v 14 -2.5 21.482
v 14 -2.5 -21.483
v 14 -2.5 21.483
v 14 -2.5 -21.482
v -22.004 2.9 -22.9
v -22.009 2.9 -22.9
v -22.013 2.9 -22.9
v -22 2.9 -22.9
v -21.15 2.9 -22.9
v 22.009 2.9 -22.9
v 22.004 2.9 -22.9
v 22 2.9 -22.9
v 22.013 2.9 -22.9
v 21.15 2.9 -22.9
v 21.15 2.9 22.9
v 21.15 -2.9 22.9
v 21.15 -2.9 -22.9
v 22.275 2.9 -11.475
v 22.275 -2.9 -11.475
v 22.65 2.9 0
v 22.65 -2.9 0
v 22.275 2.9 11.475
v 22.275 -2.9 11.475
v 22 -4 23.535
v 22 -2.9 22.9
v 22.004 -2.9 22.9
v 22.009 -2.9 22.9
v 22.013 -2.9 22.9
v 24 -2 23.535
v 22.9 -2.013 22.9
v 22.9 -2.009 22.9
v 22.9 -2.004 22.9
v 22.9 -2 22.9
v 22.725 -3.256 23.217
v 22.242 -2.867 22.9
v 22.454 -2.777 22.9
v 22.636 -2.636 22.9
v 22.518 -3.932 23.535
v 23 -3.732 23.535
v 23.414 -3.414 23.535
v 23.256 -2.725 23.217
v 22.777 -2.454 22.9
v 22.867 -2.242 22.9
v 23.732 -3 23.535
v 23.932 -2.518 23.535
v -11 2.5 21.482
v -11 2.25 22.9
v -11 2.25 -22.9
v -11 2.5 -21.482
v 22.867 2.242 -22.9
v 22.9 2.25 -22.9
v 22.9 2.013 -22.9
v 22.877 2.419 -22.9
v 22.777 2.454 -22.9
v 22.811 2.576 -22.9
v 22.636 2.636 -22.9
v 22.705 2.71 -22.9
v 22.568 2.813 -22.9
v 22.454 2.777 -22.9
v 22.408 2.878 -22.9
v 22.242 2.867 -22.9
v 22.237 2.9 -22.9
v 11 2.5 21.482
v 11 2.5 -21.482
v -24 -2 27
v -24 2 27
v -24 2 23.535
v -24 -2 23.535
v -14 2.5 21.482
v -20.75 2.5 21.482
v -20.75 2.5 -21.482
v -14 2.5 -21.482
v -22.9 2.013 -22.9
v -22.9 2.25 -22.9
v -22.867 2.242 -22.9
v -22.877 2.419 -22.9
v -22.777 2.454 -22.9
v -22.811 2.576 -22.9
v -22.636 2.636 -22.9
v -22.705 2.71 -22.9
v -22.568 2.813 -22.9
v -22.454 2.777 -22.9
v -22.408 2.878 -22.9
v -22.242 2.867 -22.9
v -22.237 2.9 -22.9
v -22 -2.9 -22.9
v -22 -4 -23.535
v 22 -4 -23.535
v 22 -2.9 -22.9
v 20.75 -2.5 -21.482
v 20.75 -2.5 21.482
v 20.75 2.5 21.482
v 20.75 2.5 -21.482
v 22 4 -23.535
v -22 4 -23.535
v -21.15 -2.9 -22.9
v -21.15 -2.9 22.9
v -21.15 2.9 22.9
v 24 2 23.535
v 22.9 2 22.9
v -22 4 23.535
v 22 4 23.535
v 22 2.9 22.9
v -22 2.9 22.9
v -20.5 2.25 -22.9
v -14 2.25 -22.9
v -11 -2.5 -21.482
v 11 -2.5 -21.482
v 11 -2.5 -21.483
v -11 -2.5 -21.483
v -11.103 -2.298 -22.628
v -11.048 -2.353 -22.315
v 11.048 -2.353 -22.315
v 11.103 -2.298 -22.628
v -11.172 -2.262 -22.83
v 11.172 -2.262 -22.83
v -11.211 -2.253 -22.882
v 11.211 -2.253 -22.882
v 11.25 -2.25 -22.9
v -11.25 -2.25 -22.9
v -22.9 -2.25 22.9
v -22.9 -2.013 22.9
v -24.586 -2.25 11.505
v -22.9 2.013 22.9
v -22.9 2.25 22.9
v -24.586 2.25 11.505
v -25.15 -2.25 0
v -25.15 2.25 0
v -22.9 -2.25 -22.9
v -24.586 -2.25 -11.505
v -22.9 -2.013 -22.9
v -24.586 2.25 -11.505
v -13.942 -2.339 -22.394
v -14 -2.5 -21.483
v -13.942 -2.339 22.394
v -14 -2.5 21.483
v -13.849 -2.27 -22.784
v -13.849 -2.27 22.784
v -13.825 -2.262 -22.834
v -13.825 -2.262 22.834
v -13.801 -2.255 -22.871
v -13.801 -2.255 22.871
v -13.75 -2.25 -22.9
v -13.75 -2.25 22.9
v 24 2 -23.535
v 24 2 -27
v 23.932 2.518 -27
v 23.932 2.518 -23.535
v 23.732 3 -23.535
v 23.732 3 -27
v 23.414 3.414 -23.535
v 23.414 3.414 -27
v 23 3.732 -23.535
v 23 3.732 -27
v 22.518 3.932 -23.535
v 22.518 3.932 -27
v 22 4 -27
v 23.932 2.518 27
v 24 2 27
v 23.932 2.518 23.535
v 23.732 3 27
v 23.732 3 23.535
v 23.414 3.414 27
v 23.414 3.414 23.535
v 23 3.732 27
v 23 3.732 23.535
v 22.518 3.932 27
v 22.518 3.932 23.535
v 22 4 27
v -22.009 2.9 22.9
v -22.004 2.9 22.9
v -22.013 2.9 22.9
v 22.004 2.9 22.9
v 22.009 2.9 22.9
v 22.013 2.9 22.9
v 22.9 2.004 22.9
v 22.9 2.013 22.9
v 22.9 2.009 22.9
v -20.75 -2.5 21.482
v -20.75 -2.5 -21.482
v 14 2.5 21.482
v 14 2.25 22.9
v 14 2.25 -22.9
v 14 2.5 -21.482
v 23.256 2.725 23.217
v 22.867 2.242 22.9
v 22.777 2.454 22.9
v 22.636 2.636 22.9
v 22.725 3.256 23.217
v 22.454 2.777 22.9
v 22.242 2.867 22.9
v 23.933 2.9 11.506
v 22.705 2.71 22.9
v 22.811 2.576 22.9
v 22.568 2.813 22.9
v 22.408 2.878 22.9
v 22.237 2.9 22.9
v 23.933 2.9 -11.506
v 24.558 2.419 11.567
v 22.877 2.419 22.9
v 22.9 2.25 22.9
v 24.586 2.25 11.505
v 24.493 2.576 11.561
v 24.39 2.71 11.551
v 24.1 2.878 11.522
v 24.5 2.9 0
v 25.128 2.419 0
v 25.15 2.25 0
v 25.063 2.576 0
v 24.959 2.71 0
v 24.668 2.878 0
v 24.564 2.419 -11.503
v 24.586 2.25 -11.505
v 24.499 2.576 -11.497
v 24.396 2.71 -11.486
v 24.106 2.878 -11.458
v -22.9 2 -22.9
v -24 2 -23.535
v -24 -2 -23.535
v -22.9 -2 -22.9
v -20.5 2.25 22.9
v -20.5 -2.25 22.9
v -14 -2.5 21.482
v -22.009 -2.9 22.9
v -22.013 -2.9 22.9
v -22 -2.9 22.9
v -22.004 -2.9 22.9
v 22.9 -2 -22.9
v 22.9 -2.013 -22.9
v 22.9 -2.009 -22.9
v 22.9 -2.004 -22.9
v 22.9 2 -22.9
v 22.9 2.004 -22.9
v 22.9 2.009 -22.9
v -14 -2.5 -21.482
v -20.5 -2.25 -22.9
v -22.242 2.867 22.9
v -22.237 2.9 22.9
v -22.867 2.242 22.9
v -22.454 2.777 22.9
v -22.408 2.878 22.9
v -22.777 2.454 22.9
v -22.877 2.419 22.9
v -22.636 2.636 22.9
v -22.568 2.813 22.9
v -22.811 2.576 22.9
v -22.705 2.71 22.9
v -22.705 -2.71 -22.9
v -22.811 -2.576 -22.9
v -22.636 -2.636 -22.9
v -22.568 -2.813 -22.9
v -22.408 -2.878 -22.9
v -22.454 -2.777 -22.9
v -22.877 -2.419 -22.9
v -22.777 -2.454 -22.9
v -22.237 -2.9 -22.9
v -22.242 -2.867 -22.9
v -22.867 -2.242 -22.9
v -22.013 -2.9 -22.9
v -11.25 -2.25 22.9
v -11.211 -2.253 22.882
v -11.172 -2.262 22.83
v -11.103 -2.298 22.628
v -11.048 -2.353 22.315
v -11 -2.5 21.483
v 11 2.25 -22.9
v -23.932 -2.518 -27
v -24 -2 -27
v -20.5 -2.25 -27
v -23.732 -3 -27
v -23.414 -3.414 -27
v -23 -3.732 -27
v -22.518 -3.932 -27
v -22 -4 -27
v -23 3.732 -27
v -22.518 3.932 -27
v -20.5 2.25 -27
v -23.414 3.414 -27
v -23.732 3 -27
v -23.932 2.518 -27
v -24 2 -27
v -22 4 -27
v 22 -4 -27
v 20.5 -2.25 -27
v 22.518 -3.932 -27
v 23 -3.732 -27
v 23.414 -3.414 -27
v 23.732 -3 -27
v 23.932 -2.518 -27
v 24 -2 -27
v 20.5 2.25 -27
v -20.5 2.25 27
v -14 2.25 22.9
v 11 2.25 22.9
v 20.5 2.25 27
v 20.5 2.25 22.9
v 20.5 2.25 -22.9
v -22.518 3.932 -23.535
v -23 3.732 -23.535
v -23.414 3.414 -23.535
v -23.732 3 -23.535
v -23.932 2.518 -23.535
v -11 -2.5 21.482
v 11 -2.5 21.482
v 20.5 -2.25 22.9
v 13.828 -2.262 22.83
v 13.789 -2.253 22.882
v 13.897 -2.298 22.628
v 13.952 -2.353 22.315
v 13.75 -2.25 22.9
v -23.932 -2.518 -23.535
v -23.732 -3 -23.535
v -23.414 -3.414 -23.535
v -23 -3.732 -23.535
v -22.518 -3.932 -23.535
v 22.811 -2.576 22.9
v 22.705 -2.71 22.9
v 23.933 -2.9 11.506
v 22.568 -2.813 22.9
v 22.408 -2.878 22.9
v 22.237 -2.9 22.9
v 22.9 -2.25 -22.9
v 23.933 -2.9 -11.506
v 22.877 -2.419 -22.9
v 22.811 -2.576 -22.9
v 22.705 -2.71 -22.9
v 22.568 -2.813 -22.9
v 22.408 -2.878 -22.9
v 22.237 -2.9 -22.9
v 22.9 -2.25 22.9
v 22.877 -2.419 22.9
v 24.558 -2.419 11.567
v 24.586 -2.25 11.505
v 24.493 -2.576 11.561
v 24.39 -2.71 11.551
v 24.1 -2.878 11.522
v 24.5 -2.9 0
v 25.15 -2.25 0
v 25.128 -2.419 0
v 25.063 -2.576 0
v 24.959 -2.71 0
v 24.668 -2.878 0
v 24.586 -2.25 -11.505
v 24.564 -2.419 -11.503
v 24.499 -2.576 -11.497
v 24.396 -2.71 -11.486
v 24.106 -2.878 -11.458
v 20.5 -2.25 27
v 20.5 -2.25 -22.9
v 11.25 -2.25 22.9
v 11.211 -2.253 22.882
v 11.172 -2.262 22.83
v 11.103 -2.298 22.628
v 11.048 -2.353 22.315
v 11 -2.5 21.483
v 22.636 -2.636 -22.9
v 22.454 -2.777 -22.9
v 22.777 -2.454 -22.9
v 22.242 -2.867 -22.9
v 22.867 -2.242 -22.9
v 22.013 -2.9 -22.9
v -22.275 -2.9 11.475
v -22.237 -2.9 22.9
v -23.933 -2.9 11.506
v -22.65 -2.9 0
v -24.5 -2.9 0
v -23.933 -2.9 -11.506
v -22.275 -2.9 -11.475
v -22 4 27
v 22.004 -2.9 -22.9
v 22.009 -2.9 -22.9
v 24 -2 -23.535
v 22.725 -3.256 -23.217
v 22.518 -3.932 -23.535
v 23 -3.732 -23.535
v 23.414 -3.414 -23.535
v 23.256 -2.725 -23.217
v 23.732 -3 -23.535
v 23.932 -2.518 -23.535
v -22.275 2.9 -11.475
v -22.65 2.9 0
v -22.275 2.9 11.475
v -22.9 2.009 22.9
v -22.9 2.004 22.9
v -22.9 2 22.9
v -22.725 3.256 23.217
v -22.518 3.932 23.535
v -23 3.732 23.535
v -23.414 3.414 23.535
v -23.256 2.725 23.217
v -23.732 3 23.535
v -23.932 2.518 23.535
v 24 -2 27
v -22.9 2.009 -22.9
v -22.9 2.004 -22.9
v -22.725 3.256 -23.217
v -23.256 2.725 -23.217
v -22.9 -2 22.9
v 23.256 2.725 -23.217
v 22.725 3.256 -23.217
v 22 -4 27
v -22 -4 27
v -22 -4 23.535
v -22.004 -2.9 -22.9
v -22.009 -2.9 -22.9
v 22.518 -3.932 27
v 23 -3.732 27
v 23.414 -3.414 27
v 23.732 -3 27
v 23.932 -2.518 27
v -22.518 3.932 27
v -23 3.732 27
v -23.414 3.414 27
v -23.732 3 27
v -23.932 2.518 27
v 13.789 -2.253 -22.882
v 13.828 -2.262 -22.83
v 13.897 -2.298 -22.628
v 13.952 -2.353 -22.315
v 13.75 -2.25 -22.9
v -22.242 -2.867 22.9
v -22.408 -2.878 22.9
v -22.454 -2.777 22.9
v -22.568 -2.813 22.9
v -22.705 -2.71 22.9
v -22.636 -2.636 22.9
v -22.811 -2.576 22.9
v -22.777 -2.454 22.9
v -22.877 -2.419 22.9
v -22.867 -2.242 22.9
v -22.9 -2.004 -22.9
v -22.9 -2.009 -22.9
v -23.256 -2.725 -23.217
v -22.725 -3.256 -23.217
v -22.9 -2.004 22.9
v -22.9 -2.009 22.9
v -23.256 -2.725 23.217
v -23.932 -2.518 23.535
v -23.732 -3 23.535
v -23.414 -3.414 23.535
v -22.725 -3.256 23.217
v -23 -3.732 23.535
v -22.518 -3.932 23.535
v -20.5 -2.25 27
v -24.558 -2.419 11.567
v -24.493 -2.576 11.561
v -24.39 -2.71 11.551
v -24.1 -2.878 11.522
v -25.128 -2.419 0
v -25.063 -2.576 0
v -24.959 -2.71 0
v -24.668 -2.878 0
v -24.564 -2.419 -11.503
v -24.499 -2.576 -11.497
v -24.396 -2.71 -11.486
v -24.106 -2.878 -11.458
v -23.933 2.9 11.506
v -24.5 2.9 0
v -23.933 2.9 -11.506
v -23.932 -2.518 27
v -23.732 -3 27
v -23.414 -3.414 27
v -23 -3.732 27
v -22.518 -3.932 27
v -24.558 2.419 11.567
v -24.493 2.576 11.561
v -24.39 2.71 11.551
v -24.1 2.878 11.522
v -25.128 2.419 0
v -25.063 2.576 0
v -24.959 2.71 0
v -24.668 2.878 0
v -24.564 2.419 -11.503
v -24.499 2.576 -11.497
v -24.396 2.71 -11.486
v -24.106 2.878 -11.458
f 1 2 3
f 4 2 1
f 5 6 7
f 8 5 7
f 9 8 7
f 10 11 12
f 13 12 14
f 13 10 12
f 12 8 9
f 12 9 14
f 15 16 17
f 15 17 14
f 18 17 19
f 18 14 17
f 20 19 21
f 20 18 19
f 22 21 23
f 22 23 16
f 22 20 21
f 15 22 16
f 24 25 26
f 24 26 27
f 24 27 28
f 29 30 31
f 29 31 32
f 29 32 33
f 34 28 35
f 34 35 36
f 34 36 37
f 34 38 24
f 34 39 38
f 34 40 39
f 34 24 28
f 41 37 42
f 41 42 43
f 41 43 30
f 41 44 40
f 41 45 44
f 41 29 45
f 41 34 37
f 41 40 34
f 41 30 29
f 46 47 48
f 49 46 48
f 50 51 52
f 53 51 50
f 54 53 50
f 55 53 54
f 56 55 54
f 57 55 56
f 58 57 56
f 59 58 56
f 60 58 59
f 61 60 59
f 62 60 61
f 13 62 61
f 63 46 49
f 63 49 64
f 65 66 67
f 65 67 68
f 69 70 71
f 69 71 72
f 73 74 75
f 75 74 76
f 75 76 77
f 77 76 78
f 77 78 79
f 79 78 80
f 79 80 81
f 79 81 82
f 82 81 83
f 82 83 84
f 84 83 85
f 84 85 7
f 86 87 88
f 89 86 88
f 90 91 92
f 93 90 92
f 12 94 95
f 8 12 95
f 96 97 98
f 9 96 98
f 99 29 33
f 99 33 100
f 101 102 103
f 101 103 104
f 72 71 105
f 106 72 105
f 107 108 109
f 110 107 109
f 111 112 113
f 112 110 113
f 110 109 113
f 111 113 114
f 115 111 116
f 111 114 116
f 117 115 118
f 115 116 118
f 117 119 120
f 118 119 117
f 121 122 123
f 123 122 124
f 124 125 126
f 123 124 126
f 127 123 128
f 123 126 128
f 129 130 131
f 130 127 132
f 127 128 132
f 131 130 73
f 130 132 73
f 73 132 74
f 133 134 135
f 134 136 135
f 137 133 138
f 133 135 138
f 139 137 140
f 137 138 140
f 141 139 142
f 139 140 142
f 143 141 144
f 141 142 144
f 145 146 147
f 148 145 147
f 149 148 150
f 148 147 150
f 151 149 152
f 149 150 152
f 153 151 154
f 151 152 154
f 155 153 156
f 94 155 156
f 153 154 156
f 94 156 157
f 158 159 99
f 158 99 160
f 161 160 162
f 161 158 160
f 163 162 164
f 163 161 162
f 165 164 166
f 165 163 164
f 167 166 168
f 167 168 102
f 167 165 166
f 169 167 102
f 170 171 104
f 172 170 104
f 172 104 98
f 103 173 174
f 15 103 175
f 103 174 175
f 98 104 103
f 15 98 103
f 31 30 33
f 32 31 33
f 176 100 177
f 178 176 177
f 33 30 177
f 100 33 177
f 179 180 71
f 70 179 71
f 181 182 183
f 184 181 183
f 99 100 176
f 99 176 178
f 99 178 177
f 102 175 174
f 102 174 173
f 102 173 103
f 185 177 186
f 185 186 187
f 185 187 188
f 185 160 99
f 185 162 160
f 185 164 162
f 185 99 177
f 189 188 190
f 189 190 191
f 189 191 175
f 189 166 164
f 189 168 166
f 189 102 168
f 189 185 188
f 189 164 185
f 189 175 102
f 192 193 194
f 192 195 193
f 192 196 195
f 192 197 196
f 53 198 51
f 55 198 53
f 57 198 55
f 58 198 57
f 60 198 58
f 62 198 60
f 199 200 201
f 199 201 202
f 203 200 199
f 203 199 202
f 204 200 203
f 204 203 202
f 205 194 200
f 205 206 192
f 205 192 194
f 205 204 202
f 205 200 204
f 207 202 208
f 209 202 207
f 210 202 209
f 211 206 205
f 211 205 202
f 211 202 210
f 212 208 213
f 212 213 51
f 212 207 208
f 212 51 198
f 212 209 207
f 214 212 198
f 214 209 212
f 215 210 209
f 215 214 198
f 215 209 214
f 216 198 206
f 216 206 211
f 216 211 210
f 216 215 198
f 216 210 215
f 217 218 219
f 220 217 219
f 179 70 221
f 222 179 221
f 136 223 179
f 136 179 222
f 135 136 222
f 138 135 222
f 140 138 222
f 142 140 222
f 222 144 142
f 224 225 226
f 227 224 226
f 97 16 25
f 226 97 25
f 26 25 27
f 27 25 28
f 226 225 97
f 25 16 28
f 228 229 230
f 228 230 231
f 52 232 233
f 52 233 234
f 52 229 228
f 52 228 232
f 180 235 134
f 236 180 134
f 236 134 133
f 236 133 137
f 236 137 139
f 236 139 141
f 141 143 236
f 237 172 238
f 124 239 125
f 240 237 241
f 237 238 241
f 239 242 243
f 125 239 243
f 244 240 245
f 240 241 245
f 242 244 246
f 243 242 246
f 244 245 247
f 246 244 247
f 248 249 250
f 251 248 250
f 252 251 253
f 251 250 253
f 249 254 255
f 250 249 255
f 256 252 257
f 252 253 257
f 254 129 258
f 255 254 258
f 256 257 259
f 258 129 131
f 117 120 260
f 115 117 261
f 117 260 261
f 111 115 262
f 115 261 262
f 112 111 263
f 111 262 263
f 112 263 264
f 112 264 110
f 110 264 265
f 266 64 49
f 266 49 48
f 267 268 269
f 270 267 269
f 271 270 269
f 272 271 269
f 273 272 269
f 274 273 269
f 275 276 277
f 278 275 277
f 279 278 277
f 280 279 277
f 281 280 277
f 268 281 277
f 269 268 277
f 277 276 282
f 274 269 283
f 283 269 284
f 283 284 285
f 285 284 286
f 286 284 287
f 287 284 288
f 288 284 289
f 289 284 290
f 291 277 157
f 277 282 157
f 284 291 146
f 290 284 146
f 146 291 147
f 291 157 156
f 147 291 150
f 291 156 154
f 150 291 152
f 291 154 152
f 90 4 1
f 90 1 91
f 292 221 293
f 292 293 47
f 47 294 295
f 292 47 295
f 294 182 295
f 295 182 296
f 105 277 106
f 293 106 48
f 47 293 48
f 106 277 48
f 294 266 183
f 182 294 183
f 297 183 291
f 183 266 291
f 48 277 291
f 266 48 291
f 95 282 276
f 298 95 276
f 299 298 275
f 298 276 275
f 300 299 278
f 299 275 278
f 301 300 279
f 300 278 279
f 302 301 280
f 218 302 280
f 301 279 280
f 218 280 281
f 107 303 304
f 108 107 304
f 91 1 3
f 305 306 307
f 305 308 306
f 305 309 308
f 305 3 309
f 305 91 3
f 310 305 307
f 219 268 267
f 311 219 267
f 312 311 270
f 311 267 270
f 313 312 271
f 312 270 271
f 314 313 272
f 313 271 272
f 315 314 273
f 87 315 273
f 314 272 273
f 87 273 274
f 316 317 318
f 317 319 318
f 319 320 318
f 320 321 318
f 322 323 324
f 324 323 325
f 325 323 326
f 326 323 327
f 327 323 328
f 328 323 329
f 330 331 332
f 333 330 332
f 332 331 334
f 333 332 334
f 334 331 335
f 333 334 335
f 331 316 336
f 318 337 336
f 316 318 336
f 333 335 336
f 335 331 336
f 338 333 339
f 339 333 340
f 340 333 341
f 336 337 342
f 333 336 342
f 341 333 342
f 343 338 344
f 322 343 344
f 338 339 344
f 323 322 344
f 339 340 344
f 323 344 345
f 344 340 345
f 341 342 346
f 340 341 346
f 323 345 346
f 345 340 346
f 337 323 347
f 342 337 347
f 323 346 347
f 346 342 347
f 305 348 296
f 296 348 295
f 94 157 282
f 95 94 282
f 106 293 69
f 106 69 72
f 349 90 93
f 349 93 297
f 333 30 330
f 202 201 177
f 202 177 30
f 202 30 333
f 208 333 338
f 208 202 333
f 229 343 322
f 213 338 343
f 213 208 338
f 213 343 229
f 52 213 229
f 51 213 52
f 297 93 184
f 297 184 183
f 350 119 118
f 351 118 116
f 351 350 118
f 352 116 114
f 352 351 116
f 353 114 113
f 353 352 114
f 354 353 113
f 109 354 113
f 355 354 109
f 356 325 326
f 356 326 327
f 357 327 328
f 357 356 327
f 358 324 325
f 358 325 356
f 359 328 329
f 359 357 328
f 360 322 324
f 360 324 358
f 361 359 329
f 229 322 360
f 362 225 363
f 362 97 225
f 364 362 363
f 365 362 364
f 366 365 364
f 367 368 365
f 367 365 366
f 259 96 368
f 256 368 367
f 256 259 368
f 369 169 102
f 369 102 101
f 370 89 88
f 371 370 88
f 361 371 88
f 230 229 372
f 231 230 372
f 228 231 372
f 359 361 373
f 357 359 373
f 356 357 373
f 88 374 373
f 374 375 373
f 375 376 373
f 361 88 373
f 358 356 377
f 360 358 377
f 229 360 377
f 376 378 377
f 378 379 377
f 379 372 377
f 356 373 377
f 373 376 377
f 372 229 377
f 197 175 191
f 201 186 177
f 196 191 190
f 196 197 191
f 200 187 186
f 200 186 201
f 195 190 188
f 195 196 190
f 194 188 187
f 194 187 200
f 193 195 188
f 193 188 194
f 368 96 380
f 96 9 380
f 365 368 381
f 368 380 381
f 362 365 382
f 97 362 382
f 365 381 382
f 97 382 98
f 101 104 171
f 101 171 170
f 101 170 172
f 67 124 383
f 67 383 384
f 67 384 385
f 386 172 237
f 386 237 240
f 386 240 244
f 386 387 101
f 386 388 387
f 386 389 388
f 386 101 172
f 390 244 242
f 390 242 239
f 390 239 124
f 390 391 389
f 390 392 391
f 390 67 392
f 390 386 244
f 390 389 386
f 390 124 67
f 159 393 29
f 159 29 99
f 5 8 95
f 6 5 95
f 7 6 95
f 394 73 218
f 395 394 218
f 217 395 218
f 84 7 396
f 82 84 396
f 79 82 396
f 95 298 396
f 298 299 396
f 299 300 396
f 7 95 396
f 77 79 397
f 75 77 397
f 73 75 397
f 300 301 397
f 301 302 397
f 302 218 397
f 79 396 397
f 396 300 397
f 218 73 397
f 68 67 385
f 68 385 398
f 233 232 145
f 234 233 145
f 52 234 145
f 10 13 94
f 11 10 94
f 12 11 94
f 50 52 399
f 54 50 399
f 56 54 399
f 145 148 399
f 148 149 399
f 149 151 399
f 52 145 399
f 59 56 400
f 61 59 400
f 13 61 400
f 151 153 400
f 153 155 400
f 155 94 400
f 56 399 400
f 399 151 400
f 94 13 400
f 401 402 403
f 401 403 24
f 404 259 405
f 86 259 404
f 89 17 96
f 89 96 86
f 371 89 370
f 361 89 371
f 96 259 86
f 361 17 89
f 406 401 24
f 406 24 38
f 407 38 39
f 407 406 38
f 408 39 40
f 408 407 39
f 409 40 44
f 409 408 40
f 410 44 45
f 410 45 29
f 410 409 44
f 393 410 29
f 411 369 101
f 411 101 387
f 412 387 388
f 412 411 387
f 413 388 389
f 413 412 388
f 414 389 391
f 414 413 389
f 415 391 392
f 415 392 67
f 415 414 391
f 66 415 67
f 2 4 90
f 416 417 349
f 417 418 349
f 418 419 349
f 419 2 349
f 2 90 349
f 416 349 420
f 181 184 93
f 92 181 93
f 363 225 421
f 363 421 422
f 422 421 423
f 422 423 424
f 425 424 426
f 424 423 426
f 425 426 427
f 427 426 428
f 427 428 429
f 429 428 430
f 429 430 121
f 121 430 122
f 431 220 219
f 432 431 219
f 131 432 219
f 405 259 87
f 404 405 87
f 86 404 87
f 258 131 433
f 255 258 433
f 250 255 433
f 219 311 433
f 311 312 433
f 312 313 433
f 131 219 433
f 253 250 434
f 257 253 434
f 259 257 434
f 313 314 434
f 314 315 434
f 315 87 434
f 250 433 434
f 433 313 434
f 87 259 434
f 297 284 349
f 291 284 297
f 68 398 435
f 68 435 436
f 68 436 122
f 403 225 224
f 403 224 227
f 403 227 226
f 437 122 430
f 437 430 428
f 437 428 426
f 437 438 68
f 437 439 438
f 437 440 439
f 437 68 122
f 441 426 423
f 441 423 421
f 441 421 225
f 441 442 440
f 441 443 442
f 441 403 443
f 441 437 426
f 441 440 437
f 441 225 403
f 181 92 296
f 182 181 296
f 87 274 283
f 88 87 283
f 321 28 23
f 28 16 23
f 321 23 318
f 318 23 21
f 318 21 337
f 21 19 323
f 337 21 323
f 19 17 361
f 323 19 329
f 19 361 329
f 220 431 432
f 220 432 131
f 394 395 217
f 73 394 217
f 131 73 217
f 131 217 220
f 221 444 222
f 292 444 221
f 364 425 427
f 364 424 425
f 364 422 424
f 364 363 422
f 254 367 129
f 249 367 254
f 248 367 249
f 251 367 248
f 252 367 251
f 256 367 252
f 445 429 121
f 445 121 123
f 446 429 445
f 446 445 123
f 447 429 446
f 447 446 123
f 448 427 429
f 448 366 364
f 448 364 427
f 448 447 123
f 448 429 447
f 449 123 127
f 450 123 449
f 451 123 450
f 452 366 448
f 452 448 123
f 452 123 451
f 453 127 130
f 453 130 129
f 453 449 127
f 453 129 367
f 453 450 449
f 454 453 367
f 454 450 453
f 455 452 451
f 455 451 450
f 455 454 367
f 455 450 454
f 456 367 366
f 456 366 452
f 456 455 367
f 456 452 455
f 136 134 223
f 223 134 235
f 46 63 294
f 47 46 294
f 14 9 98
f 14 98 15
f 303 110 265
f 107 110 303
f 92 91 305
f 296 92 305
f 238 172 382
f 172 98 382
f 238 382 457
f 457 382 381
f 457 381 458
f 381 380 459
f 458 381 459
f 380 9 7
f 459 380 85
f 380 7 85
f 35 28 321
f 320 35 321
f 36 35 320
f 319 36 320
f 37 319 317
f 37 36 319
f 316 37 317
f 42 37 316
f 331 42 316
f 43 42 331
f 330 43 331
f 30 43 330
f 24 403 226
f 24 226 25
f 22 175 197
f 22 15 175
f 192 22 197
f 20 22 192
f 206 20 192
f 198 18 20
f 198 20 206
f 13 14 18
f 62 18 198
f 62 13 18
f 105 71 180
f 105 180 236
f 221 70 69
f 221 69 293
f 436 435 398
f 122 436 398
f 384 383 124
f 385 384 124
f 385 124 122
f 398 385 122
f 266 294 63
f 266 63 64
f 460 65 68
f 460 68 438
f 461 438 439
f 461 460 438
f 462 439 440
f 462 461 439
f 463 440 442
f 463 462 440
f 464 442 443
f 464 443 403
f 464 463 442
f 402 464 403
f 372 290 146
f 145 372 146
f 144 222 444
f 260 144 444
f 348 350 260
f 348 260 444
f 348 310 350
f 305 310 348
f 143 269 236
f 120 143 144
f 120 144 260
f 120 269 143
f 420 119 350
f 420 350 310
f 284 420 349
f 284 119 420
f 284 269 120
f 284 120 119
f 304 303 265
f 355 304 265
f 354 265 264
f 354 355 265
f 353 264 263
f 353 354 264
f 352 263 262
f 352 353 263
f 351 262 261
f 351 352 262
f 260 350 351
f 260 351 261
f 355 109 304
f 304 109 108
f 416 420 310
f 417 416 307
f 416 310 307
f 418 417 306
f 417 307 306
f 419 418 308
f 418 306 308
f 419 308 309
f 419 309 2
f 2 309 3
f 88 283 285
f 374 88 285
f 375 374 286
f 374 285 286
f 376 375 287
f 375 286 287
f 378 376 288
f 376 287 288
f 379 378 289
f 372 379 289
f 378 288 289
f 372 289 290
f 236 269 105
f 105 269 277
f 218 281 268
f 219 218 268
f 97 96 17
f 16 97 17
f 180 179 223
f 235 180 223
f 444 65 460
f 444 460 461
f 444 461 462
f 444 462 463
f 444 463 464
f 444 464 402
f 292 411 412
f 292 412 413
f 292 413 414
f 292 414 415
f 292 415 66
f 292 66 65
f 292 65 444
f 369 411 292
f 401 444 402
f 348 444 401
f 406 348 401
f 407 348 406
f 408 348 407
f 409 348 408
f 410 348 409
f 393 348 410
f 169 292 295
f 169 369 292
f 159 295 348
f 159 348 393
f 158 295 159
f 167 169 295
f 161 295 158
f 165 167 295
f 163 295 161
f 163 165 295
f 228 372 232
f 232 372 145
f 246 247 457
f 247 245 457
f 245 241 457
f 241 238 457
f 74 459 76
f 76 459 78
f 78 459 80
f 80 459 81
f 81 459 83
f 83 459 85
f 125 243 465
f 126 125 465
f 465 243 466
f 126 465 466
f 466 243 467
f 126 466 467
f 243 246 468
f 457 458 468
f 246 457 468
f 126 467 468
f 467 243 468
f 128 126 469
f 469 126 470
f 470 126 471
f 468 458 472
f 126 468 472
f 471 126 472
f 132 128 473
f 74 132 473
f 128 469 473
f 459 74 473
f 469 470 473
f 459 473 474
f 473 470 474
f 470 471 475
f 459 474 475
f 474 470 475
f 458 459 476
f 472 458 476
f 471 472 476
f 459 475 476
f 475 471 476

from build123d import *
from OCP.BRepFilletAPI import BRepFilletAPI_MakeChamfer

# Parameters (mm, degrees)
SKETCH1_W                                  = 42.3
SKETCH1_H                                  = 5.8
SKETCH1_W_2                                = 41.5
SKETCH1_H_2                                = 5
CORE_POCKET_DEPTH                          = 27
SKETCH2_W                                  = 41
SKETCH2_H                                  = 4.5
BOSS_EXTRUDE2_DEPTH                        = 4.1
CHAMFER2_SIZE                              = 1.1
CHAMFER2_SIZE_2                            = 0.635085296
CHAMFER3_SIZE                              = 1.417820455
CHAMFER3_SIZE_2                            = 0.25
SIDE_SUPPORT_DEPTH                         = 2.9
SIDE_SUPPORT_FILLET_R                      = 0.65
SIDE_SUPPORT_FILLET_OF_SIDE_SUPPORT_MIRR_R = 0.65
BOSS_EXTRUDE3_START                        = 4.1
SKETCH5_W                                  = 3
SKETCH5_H                                  = 0.25
BOSS_EXTRUDE3_DEPTH                        = 45.8
FILLET1_R                                  = 0.25


# Read off the part's stored shape, not the designer's step: Mirror1
# Some blends are built 0.0001 mm under size
with BuildPart() as part:
    # Sketch1 → Core-Pocket (new, symmetric)
    with BuildSketch(Plane.XY):
        Rectangle(SKETCH1_W, SKETCH1_H)
        Rectangle(SKETCH1_W_2, SKETCH1_H_2, mode=Mode.SUBTRACT)
    extrude(amount=CORE_POCKET_DEPTH, both=True)

    # Sketch2 → Boss-Extrude2 (add)
    with BuildSketch(Plane.XY.offset(27)):
        with BuildLine():
            Line((-22, -4), (22, -4))
            ThreePointArc((22, -4), (23.414213562, -3.414213562), (24, -2))
            Line((24, -2), (24, 2))
            ThreePointArc((24, 2), (23.414213562, 3.414213562), (22, 4))
            Line((22, 4), (-22, 4))
            ThreePointArc((-22, 4), (-23.414213562, 3.414213562), (-24, 2))
            Line((-24, 2), (-24, -2))
            ThreePointArc((-24, -2), (-23.414213562, -3.414213562), (-22, -4))
        make_face()
        Rectangle(SKETCH2_W, SKETCH2_H, mode=Mode.SUBTRACT)
    extrude(amount=-BOSS_EXTRUDE2_DEPTH)

    # Chamfer2
    chamfer2_edges_1 = [part.edges().sort_by_distance(p)[0] for p in [
        (23.414213562, 3.414213562, 22.9),
    ]]
    chamfer2_side_1 = [part.faces().sort_by_distance(p)[0] for p in [
        (23.4052321, 3.4052321, 22.9),
    ]]
    chamfer2_edges_2 = [part.edges().sort_by_distance(p)[0] for p in [
        (24, 0, 22.9),
    ]]
    chamfer2_side_2 = [part.faces().sort_by_distance(p)[0] for p in [
        (23.987298294, 0, 22.9),
    ]]
    chamfer2_edges_3 = [part.edges().sort_by_distance(p)[0] for p in [
        (23.414213562, -3.414213562, 22.9),
    ]]
    chamfer2_side_3 = [part.faces().sort_by_distance(p)[0] for p in [
        (23.4052321, -3.4052321, 22.9),
    ]]
    chamfer2_edges_4 = [part.edges().sort_by_distance(p)[0] for p in [
        (0, -4, 22.9),
    ]]
    chamfer2_side_4 = [part.faces().sort_by_distance(p)[0] for p in [
        (0, -3.987298294, 22.9),
    ]]
    chamfer2_edges_5 = [part.edges().sort_by_distance(p)[0] for p in [
        (-23.414213562, -3.414213562, 22.9),
    ]]
    chamfer2_side_5 = [part.faces().sort_by_distance(p)[0] for p in [
        (-23.4052321, -3.4052321, 22.9),
    ]]
    chamfer2_edges_6 = [part.edges().sort_by_distance(p)[0] for p in [
        (-24, 0, 22.9),
    ]]
    chamfer2_side_6 = [part.faces().sort_by_distance(p)[0] for p in [
        (-23.987298294, 0, 22.9),
    ]]
    chamfer2_edges_7 = [part.edges().sort_by_distance(p)[0] for p in [
        (-23.414213562, 3.414213562, 22.9),
    ]]
    chamfer2_side_7 = [part.faces().sort_by_distance(p)[0] for p in [
        (-23.4052321, 3.4052321, 22.9),
    ]]
    chamfer2_edges_8 = [part.edges().sort_by_distance(p)[0] for p in [
        (0, 4, 22.9),
    ]]
    chamfer2_side_8 = [part.faces().sort_by_distance(p)[0] for p in [
        (0, 3.987298294, 22.9),
    ]]
    chamfer2 = BRepFilletAPI_MakeChamfer(part.part.solid().wrapped)
    for e in chamfer2_edges_1:
        chamfer2.Add(CHAMFER2_SIZE - 0.0001, CHAMFER2_SIZE_2 - 0.0001, e.wrapped, chamfer2_side_1[0].wrapped)
    for e in chamfer2_edges_2:
        chamfer2.Add(CHAMFER2_SIZE - 0.0001, CHAMFER2_SIZE_2 - 0.0001, e.wrapped, chamfer2_side_2[0].wrapped)
    for e in chamfer2_edges_3:
        chamfer2.Add(CHAMFER2_SIZE - 0.0001, CHAMFER2_SIZE_2 - 0.0001, e.wrapped, chamfer2_side_3[0].wrapped)
    for e in chamfer2_edges_4:
        chamfer2.Add(CHAMFER2_SIZE - 0.0001, CHAMFER2_SIZE_2 - 0.0001, e.wrapped, chamfer2_side_4[0].wrapped)
    for e in chamfer2_edges_5:
        chamfer2.Add(CHAMFER2_SIZE - 0.0001, CHAMFER2_SIZE_2 - 0.0001, e.wrapped, chamfer2_side_5[0].wrapped)
    for e in chamfer2_edges_6:
        chamfer2.Add(CHAMFER2_SIZE - 0.0001, CHAMFER2_SIZE_2 - 0.0001, e.wrapped, chamfer2_side_6[0].wrapped)
    for e in chamfer2_edges_7:
        chamfer2.Add(CHAMFER2_SIZE - 0.0001, CHAMFER2_SIZE_2 - 0.0001, e.wrapped, chamfer2_side_7[0].wrapped)
    for e in chamfer2_edges_8:
        chamfer2.Add(CHAMFER2_SIZE - 0.0001, CHAMFER2_SIZE_2 - 0.0001, e.wrapped, chamfer2_side_8[0].wrapped)
    add(Compound.cast(chamfer2.Shape()), mode=Mode.REPLACE)  # a hair under: the kernel refuses the full size

    # Chamfer3
    # the kernel refuses this chamfer: 1.417820455, 0.25 mm, written as the material it adds along each edge
    with BuildSketch(Plane(origin=(-20.75, 2.5, 22.9), x_dir=(0, 0.006682531656101647, -0.9999776716360547), z_dir=(1, 0, 0)), Plane(origin=(20.75, -2.5, 22.9), x_dir=(0, -0.006682531656101647, -0.9999776716360547), z_dir=(-1, 0, 0))) as chamfer3_piece_1:
        Polygon((CHAMFER3_SIZE * 0.999977671569, -CHAMFER3_SIZE * 0.00668253165565), (-CHAMFER3_SIZE_2 * 0.0066825316561, -CHAMFER3_SIZE_2 * 0.999977671636), (0, 0), align=None)
    extrude(amount=41.5)
    with BuildSketch(Plane(origin=(-20.75, -2.5, 22.9), x_dir=(-0.006682531656101949, 0, -0.9999776716360547), z_dir=(0, 1, 0)), Plane(origin=(20.75, 2.5, 22.9), x_dir=(0.006682531656101949, 0, -0.9999776716360547), z_dir=(0, -1, 0))) as chamfer3_piece_2:
        Polygon((CHAMFER3_SIZE * 0.999977671569, -CHAMFER3_SIZE * 0.00668253165565), (-CHAMFER3_SIZE_2 * 0.0066825316561, -CHAMFER3_SIZE_2 * 0.999977671636), (0, 0), align=None)
    extrude(amount=5)

    # Mirror1: part across plane


with BuildPart() as part_1:
    add(part.part)
    add(part.part.mirror(Plane.XY))

    # Sketch4 → Side support (add, symmetric)
    with BuildSketch(Plane(origin=(0, 0, 0), x_dir=(1, 0, 0), z_dir=(0, 1, 0))):
        with BuildLine():
            Line((21.15, -22.9), (22.9, -22.9))
            ThreePointArc((22.9, -22.9), (25.15, 0), (22.9, 22.9))
            Line((22.9, 22.9), (21.15, 22.9))
            ThreePointArc((21.15, 22.9), (22.65, 0), (21.15, -22.9))
        make_face()
    side_support = extrude(amount=SIDE_SUPPORT_DEPTH, both=True)

    # side support fillet
    side_support_fillet_edges = [part_1.edges().sort_by_distance(p)[0] for p in [
        (25.15, 2.9, 0),
        (25.15, -2.9, 0),
    ]]
    fillet(side_support_fillet_edges, radius=SIDE_SUPPORT_FILLET_R)

    # Side support mirror: Side support across plane
    add(side_support.mirror(Plane(origin=(0, 0, 0), x_dir=(0, 0, 1), z_dir=(1, 0, 0))))

    # side support fillet of Side support mirr
    side_support_fillet_of_side_support_mirr_edges = [part_1.edges().sort_by_distance(p)[0] for p in [
        (-25.15, 2.9, 0),
        (-25.15, -2.9, 0),
    ]]
    fillet(side_support_fillet_of_side_support_mirr_edges, radius=SIDE_SUPPORT_FILLET_OF_SIDE_SUPPORT_MIRR_R)

    # Sketch5 → Boss-Extrude3 (add)
    with BuildSketch(Plane.XY.offset(-27).offset(BOSS_EXTRUDE3_START)):
        with Locations((-12.5, -2.375)):
            Rectangle(SKETCH5_W, SKETCH5_H)
        with Locations((12.5, -2.375)):
            Rectangle(SKETCH5_W, SKETCH5_H)
        with Locations((12.5, 2.375)):
            Rectangle(SKETCH5_W, SKETCH5_H)
        with Locations((-12.5, 2.375)):
            Rectangle(SKETCH5_W, SKETCH5_H)
    extrude(amount=BOSS_EXTRUDE3_DEPTH)

    # Fillet1
    fillet1_edges = [part_1.edges().sort_by_distance(p)[0] for p in [
        (14, -2.25, 0),
        (11, -2.25, 0),
        (-14, -2.25, 0),
        (-11, -2.25, 0),
    ]]
    fillet(fillet1_edges, radius=FILLET1_R - 0.0001)  # a hair under: the kernel refuses the full size


solid = part_1.part
